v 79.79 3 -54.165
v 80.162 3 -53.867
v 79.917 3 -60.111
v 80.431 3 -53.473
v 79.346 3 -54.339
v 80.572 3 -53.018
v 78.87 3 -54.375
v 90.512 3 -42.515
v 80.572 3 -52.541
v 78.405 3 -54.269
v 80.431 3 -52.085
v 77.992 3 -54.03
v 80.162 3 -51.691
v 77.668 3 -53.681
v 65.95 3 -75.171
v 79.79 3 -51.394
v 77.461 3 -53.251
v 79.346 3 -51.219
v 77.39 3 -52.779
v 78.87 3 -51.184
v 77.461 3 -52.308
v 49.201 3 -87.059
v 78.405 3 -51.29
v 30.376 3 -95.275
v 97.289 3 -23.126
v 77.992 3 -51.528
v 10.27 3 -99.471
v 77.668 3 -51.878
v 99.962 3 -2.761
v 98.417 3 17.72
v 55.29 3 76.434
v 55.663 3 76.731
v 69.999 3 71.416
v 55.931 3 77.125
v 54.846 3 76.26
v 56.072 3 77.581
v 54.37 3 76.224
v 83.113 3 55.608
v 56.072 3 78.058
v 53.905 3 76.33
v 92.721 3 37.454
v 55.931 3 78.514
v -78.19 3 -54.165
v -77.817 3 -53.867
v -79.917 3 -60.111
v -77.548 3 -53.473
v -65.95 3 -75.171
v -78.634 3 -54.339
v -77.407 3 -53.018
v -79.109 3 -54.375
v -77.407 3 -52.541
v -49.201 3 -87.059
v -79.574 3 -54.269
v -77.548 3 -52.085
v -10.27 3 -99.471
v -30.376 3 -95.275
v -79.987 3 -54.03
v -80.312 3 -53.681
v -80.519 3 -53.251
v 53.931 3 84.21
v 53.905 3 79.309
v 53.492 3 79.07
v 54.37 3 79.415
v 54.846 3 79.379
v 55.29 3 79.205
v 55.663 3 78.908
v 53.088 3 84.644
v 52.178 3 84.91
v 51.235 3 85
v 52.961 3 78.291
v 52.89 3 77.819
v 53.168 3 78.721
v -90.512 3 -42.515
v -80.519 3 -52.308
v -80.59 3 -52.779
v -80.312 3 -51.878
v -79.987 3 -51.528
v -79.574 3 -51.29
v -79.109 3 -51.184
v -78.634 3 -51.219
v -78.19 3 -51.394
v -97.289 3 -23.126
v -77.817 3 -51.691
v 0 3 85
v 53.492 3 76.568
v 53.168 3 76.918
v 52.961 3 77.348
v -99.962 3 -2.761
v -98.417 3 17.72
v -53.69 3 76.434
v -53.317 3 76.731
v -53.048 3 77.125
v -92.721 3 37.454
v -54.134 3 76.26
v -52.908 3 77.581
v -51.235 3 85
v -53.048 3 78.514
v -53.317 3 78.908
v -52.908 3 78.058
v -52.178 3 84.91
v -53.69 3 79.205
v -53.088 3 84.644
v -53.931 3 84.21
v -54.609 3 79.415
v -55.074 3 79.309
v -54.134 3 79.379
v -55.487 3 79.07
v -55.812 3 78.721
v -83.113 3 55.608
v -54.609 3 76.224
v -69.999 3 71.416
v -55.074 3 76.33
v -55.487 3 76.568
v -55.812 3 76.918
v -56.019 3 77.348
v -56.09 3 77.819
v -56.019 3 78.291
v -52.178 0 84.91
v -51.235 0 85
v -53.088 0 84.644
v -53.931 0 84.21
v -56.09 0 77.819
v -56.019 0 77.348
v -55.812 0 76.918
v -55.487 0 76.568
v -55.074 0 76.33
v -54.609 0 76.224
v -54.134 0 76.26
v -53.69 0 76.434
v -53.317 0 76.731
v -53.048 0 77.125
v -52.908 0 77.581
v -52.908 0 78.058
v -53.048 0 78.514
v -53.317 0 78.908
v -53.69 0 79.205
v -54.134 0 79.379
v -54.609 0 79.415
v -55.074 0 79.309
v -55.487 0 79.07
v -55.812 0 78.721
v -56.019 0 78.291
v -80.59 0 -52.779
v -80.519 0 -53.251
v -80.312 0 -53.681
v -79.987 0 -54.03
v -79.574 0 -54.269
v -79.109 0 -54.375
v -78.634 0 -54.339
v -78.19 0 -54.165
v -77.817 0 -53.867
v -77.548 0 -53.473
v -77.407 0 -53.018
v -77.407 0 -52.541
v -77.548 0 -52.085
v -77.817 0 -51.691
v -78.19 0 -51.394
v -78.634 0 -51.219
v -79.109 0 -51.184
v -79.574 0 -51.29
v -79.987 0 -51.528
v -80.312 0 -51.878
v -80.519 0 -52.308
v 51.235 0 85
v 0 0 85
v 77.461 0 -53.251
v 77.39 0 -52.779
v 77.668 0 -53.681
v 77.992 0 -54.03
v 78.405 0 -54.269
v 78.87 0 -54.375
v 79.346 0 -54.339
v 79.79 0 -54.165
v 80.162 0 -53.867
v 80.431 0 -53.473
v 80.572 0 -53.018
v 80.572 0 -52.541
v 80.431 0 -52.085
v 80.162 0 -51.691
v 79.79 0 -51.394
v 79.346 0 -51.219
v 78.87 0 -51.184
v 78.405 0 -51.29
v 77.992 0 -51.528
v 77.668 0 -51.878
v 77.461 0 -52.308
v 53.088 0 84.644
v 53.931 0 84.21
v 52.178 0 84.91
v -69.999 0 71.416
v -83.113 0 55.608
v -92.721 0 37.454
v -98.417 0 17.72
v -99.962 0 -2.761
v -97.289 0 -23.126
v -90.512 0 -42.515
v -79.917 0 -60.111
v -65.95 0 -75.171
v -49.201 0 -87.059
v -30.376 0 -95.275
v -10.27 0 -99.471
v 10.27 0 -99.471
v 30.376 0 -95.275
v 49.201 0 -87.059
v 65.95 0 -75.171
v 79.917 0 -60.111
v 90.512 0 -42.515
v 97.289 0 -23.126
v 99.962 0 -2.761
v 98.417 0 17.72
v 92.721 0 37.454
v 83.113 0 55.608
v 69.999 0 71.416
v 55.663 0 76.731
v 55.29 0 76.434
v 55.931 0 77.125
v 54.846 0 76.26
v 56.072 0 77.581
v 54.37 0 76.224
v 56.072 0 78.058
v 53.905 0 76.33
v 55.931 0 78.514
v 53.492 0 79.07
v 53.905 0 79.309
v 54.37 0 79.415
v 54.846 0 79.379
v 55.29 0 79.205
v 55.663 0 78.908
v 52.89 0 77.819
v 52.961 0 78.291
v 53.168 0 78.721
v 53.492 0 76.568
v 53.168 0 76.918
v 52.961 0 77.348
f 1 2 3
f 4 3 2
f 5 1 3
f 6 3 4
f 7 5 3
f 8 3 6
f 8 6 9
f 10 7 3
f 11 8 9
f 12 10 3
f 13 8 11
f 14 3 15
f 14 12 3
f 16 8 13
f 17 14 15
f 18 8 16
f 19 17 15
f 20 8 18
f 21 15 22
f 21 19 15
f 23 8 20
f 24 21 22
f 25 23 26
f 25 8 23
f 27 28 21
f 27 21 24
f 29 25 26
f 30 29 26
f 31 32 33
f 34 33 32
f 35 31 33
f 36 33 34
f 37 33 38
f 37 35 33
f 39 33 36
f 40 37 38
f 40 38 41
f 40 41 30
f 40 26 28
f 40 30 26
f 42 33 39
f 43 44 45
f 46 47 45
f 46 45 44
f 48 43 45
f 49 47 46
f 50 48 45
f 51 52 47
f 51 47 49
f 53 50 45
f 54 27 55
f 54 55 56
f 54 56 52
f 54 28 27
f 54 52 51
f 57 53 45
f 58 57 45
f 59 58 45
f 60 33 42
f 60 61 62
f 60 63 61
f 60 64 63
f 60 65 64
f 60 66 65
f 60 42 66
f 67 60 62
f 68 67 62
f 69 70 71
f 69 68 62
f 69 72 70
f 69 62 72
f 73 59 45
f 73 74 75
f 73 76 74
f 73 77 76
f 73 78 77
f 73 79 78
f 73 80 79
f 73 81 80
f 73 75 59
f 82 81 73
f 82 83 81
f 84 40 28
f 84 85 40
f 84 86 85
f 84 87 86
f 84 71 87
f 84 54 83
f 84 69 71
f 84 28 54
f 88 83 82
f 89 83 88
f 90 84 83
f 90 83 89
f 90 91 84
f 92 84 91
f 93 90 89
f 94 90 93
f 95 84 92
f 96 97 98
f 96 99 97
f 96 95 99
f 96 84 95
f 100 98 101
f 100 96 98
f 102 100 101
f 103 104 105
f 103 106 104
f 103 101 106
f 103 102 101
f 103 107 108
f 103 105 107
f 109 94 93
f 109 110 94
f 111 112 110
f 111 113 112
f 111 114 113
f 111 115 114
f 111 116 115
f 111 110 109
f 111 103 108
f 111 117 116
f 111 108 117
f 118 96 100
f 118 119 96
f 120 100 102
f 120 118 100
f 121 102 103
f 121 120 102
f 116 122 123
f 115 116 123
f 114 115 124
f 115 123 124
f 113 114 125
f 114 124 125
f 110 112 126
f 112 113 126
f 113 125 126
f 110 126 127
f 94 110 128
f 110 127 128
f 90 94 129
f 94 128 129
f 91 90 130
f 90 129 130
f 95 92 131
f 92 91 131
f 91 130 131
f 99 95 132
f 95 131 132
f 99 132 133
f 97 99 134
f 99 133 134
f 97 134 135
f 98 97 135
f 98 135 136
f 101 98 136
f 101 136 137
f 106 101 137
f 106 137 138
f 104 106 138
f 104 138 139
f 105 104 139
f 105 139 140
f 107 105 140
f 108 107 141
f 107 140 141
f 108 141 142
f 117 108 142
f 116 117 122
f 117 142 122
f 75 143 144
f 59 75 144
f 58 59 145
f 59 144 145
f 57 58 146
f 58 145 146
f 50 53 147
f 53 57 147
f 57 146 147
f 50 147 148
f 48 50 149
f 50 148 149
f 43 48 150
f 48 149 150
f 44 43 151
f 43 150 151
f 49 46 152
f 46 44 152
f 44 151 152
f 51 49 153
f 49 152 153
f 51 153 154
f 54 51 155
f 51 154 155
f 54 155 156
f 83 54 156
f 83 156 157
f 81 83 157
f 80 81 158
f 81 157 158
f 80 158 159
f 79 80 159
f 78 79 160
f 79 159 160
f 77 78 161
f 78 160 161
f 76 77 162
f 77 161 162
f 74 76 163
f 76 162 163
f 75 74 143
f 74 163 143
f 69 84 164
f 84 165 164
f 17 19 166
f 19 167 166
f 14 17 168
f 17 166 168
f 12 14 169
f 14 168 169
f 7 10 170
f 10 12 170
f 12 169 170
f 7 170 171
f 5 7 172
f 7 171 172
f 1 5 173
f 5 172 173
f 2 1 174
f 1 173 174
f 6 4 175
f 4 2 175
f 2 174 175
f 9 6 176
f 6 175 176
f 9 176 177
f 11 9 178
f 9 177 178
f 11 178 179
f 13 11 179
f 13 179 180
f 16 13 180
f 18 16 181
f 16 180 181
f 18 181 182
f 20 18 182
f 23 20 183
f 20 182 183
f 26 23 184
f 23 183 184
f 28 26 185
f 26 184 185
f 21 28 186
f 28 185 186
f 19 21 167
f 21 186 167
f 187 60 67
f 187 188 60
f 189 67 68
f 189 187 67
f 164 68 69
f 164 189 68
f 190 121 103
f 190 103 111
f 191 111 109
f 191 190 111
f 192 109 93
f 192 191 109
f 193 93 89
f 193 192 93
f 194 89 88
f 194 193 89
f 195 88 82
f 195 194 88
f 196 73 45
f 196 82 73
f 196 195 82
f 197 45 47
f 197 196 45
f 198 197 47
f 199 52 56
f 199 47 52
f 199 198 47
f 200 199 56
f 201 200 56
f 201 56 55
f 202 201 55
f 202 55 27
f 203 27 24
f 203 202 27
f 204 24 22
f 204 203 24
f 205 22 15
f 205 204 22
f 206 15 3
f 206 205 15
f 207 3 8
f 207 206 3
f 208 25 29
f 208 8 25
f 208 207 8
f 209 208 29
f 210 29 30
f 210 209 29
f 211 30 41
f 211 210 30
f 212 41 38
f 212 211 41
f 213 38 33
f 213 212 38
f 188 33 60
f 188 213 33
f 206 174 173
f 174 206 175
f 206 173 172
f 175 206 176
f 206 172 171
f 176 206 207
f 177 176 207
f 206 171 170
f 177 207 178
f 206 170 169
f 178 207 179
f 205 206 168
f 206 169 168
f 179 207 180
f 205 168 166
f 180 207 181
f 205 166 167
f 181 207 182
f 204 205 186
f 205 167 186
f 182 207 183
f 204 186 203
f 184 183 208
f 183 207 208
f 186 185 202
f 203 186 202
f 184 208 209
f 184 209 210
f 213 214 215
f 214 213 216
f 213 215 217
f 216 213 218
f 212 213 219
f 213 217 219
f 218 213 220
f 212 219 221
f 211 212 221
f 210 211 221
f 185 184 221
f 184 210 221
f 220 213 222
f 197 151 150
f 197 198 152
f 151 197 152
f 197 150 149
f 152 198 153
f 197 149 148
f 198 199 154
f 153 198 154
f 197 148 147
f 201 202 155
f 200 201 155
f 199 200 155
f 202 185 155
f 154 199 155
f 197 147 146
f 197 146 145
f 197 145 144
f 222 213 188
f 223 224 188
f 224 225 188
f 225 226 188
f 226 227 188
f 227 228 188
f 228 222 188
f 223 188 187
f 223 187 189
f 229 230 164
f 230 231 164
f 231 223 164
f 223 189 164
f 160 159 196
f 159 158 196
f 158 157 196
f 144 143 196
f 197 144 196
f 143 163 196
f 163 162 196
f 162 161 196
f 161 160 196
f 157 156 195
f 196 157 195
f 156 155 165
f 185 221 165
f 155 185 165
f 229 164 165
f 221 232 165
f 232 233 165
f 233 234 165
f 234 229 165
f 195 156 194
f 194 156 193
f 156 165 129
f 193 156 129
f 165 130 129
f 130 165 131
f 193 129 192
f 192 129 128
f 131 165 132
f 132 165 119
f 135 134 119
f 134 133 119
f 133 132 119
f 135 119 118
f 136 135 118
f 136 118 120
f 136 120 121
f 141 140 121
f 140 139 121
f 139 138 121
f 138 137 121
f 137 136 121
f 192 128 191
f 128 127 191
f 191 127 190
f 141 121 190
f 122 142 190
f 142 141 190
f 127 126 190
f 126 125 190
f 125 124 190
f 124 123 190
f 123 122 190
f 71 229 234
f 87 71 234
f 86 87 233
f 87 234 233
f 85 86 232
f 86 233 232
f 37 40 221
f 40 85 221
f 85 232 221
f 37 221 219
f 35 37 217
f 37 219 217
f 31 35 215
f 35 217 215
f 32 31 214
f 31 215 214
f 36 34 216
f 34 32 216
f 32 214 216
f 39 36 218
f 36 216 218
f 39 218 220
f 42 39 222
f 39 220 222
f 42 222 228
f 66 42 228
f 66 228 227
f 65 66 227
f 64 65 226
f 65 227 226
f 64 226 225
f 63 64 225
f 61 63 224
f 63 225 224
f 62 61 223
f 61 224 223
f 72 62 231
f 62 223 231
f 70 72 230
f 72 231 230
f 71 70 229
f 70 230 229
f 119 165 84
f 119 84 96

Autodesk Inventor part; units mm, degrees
ref_plane "YZ Plane" through (0, 0, 0) normal (1, 0, 0) x (0, 1, 0)
ref_plane "XZ Plane" through (0, 0, 0) normal (0, 1, 0) x (-1, 0, 0)
ref_plane "XY Plane" through (0, 0, 0) normal (0, 0, 1) x (1, 0, 0)
sketch "Sketch1" plane through (0, 0, 0) normal (0, 1, 0) x (-1, 0, 0)
  circle A0 centre (-54.4898, 77.8194) radius 1.6
  circle A1 centre (54.4898, 77.8194) radius 1.6
  circle A2 centre (-78.9896, -52.7792) radius 1.6
  circle A3 centre (78.9896, -52.7792) radius 1.6
  line L0 (0, 85) -> (51.2348, 85)
  line L1 (0, 85) -> (-51.2348, 85)
  arc A4 (-53.9313, 84.2105) -> (53.9313, 84.2105) centre (0, 0) ccw
  arc A5 (53.9313, 84.2105) -> (51.2348, 85) centre (51.2348, 80) ccw
  arc A6 (-51.2348, 85) -> (-53.9313, 84.2105) centre (-51.2348, 80) ccw
  point P0 (-54.3117, 78)
  point P1 (54.3117, 78)
  point P2 (52.6783, 85)
  point P3 (-52.6783, 85)
  dimension "d11" = 3.2
  dimension "d12" = 3.2
  dimension "d13" = 3.2
  dimension "d14" = 3.2
  dimension "d20" = 5
extrude "Extrusion1" add sketch "Sketch1" along normal blind 3
properties part number "Top Plate"
